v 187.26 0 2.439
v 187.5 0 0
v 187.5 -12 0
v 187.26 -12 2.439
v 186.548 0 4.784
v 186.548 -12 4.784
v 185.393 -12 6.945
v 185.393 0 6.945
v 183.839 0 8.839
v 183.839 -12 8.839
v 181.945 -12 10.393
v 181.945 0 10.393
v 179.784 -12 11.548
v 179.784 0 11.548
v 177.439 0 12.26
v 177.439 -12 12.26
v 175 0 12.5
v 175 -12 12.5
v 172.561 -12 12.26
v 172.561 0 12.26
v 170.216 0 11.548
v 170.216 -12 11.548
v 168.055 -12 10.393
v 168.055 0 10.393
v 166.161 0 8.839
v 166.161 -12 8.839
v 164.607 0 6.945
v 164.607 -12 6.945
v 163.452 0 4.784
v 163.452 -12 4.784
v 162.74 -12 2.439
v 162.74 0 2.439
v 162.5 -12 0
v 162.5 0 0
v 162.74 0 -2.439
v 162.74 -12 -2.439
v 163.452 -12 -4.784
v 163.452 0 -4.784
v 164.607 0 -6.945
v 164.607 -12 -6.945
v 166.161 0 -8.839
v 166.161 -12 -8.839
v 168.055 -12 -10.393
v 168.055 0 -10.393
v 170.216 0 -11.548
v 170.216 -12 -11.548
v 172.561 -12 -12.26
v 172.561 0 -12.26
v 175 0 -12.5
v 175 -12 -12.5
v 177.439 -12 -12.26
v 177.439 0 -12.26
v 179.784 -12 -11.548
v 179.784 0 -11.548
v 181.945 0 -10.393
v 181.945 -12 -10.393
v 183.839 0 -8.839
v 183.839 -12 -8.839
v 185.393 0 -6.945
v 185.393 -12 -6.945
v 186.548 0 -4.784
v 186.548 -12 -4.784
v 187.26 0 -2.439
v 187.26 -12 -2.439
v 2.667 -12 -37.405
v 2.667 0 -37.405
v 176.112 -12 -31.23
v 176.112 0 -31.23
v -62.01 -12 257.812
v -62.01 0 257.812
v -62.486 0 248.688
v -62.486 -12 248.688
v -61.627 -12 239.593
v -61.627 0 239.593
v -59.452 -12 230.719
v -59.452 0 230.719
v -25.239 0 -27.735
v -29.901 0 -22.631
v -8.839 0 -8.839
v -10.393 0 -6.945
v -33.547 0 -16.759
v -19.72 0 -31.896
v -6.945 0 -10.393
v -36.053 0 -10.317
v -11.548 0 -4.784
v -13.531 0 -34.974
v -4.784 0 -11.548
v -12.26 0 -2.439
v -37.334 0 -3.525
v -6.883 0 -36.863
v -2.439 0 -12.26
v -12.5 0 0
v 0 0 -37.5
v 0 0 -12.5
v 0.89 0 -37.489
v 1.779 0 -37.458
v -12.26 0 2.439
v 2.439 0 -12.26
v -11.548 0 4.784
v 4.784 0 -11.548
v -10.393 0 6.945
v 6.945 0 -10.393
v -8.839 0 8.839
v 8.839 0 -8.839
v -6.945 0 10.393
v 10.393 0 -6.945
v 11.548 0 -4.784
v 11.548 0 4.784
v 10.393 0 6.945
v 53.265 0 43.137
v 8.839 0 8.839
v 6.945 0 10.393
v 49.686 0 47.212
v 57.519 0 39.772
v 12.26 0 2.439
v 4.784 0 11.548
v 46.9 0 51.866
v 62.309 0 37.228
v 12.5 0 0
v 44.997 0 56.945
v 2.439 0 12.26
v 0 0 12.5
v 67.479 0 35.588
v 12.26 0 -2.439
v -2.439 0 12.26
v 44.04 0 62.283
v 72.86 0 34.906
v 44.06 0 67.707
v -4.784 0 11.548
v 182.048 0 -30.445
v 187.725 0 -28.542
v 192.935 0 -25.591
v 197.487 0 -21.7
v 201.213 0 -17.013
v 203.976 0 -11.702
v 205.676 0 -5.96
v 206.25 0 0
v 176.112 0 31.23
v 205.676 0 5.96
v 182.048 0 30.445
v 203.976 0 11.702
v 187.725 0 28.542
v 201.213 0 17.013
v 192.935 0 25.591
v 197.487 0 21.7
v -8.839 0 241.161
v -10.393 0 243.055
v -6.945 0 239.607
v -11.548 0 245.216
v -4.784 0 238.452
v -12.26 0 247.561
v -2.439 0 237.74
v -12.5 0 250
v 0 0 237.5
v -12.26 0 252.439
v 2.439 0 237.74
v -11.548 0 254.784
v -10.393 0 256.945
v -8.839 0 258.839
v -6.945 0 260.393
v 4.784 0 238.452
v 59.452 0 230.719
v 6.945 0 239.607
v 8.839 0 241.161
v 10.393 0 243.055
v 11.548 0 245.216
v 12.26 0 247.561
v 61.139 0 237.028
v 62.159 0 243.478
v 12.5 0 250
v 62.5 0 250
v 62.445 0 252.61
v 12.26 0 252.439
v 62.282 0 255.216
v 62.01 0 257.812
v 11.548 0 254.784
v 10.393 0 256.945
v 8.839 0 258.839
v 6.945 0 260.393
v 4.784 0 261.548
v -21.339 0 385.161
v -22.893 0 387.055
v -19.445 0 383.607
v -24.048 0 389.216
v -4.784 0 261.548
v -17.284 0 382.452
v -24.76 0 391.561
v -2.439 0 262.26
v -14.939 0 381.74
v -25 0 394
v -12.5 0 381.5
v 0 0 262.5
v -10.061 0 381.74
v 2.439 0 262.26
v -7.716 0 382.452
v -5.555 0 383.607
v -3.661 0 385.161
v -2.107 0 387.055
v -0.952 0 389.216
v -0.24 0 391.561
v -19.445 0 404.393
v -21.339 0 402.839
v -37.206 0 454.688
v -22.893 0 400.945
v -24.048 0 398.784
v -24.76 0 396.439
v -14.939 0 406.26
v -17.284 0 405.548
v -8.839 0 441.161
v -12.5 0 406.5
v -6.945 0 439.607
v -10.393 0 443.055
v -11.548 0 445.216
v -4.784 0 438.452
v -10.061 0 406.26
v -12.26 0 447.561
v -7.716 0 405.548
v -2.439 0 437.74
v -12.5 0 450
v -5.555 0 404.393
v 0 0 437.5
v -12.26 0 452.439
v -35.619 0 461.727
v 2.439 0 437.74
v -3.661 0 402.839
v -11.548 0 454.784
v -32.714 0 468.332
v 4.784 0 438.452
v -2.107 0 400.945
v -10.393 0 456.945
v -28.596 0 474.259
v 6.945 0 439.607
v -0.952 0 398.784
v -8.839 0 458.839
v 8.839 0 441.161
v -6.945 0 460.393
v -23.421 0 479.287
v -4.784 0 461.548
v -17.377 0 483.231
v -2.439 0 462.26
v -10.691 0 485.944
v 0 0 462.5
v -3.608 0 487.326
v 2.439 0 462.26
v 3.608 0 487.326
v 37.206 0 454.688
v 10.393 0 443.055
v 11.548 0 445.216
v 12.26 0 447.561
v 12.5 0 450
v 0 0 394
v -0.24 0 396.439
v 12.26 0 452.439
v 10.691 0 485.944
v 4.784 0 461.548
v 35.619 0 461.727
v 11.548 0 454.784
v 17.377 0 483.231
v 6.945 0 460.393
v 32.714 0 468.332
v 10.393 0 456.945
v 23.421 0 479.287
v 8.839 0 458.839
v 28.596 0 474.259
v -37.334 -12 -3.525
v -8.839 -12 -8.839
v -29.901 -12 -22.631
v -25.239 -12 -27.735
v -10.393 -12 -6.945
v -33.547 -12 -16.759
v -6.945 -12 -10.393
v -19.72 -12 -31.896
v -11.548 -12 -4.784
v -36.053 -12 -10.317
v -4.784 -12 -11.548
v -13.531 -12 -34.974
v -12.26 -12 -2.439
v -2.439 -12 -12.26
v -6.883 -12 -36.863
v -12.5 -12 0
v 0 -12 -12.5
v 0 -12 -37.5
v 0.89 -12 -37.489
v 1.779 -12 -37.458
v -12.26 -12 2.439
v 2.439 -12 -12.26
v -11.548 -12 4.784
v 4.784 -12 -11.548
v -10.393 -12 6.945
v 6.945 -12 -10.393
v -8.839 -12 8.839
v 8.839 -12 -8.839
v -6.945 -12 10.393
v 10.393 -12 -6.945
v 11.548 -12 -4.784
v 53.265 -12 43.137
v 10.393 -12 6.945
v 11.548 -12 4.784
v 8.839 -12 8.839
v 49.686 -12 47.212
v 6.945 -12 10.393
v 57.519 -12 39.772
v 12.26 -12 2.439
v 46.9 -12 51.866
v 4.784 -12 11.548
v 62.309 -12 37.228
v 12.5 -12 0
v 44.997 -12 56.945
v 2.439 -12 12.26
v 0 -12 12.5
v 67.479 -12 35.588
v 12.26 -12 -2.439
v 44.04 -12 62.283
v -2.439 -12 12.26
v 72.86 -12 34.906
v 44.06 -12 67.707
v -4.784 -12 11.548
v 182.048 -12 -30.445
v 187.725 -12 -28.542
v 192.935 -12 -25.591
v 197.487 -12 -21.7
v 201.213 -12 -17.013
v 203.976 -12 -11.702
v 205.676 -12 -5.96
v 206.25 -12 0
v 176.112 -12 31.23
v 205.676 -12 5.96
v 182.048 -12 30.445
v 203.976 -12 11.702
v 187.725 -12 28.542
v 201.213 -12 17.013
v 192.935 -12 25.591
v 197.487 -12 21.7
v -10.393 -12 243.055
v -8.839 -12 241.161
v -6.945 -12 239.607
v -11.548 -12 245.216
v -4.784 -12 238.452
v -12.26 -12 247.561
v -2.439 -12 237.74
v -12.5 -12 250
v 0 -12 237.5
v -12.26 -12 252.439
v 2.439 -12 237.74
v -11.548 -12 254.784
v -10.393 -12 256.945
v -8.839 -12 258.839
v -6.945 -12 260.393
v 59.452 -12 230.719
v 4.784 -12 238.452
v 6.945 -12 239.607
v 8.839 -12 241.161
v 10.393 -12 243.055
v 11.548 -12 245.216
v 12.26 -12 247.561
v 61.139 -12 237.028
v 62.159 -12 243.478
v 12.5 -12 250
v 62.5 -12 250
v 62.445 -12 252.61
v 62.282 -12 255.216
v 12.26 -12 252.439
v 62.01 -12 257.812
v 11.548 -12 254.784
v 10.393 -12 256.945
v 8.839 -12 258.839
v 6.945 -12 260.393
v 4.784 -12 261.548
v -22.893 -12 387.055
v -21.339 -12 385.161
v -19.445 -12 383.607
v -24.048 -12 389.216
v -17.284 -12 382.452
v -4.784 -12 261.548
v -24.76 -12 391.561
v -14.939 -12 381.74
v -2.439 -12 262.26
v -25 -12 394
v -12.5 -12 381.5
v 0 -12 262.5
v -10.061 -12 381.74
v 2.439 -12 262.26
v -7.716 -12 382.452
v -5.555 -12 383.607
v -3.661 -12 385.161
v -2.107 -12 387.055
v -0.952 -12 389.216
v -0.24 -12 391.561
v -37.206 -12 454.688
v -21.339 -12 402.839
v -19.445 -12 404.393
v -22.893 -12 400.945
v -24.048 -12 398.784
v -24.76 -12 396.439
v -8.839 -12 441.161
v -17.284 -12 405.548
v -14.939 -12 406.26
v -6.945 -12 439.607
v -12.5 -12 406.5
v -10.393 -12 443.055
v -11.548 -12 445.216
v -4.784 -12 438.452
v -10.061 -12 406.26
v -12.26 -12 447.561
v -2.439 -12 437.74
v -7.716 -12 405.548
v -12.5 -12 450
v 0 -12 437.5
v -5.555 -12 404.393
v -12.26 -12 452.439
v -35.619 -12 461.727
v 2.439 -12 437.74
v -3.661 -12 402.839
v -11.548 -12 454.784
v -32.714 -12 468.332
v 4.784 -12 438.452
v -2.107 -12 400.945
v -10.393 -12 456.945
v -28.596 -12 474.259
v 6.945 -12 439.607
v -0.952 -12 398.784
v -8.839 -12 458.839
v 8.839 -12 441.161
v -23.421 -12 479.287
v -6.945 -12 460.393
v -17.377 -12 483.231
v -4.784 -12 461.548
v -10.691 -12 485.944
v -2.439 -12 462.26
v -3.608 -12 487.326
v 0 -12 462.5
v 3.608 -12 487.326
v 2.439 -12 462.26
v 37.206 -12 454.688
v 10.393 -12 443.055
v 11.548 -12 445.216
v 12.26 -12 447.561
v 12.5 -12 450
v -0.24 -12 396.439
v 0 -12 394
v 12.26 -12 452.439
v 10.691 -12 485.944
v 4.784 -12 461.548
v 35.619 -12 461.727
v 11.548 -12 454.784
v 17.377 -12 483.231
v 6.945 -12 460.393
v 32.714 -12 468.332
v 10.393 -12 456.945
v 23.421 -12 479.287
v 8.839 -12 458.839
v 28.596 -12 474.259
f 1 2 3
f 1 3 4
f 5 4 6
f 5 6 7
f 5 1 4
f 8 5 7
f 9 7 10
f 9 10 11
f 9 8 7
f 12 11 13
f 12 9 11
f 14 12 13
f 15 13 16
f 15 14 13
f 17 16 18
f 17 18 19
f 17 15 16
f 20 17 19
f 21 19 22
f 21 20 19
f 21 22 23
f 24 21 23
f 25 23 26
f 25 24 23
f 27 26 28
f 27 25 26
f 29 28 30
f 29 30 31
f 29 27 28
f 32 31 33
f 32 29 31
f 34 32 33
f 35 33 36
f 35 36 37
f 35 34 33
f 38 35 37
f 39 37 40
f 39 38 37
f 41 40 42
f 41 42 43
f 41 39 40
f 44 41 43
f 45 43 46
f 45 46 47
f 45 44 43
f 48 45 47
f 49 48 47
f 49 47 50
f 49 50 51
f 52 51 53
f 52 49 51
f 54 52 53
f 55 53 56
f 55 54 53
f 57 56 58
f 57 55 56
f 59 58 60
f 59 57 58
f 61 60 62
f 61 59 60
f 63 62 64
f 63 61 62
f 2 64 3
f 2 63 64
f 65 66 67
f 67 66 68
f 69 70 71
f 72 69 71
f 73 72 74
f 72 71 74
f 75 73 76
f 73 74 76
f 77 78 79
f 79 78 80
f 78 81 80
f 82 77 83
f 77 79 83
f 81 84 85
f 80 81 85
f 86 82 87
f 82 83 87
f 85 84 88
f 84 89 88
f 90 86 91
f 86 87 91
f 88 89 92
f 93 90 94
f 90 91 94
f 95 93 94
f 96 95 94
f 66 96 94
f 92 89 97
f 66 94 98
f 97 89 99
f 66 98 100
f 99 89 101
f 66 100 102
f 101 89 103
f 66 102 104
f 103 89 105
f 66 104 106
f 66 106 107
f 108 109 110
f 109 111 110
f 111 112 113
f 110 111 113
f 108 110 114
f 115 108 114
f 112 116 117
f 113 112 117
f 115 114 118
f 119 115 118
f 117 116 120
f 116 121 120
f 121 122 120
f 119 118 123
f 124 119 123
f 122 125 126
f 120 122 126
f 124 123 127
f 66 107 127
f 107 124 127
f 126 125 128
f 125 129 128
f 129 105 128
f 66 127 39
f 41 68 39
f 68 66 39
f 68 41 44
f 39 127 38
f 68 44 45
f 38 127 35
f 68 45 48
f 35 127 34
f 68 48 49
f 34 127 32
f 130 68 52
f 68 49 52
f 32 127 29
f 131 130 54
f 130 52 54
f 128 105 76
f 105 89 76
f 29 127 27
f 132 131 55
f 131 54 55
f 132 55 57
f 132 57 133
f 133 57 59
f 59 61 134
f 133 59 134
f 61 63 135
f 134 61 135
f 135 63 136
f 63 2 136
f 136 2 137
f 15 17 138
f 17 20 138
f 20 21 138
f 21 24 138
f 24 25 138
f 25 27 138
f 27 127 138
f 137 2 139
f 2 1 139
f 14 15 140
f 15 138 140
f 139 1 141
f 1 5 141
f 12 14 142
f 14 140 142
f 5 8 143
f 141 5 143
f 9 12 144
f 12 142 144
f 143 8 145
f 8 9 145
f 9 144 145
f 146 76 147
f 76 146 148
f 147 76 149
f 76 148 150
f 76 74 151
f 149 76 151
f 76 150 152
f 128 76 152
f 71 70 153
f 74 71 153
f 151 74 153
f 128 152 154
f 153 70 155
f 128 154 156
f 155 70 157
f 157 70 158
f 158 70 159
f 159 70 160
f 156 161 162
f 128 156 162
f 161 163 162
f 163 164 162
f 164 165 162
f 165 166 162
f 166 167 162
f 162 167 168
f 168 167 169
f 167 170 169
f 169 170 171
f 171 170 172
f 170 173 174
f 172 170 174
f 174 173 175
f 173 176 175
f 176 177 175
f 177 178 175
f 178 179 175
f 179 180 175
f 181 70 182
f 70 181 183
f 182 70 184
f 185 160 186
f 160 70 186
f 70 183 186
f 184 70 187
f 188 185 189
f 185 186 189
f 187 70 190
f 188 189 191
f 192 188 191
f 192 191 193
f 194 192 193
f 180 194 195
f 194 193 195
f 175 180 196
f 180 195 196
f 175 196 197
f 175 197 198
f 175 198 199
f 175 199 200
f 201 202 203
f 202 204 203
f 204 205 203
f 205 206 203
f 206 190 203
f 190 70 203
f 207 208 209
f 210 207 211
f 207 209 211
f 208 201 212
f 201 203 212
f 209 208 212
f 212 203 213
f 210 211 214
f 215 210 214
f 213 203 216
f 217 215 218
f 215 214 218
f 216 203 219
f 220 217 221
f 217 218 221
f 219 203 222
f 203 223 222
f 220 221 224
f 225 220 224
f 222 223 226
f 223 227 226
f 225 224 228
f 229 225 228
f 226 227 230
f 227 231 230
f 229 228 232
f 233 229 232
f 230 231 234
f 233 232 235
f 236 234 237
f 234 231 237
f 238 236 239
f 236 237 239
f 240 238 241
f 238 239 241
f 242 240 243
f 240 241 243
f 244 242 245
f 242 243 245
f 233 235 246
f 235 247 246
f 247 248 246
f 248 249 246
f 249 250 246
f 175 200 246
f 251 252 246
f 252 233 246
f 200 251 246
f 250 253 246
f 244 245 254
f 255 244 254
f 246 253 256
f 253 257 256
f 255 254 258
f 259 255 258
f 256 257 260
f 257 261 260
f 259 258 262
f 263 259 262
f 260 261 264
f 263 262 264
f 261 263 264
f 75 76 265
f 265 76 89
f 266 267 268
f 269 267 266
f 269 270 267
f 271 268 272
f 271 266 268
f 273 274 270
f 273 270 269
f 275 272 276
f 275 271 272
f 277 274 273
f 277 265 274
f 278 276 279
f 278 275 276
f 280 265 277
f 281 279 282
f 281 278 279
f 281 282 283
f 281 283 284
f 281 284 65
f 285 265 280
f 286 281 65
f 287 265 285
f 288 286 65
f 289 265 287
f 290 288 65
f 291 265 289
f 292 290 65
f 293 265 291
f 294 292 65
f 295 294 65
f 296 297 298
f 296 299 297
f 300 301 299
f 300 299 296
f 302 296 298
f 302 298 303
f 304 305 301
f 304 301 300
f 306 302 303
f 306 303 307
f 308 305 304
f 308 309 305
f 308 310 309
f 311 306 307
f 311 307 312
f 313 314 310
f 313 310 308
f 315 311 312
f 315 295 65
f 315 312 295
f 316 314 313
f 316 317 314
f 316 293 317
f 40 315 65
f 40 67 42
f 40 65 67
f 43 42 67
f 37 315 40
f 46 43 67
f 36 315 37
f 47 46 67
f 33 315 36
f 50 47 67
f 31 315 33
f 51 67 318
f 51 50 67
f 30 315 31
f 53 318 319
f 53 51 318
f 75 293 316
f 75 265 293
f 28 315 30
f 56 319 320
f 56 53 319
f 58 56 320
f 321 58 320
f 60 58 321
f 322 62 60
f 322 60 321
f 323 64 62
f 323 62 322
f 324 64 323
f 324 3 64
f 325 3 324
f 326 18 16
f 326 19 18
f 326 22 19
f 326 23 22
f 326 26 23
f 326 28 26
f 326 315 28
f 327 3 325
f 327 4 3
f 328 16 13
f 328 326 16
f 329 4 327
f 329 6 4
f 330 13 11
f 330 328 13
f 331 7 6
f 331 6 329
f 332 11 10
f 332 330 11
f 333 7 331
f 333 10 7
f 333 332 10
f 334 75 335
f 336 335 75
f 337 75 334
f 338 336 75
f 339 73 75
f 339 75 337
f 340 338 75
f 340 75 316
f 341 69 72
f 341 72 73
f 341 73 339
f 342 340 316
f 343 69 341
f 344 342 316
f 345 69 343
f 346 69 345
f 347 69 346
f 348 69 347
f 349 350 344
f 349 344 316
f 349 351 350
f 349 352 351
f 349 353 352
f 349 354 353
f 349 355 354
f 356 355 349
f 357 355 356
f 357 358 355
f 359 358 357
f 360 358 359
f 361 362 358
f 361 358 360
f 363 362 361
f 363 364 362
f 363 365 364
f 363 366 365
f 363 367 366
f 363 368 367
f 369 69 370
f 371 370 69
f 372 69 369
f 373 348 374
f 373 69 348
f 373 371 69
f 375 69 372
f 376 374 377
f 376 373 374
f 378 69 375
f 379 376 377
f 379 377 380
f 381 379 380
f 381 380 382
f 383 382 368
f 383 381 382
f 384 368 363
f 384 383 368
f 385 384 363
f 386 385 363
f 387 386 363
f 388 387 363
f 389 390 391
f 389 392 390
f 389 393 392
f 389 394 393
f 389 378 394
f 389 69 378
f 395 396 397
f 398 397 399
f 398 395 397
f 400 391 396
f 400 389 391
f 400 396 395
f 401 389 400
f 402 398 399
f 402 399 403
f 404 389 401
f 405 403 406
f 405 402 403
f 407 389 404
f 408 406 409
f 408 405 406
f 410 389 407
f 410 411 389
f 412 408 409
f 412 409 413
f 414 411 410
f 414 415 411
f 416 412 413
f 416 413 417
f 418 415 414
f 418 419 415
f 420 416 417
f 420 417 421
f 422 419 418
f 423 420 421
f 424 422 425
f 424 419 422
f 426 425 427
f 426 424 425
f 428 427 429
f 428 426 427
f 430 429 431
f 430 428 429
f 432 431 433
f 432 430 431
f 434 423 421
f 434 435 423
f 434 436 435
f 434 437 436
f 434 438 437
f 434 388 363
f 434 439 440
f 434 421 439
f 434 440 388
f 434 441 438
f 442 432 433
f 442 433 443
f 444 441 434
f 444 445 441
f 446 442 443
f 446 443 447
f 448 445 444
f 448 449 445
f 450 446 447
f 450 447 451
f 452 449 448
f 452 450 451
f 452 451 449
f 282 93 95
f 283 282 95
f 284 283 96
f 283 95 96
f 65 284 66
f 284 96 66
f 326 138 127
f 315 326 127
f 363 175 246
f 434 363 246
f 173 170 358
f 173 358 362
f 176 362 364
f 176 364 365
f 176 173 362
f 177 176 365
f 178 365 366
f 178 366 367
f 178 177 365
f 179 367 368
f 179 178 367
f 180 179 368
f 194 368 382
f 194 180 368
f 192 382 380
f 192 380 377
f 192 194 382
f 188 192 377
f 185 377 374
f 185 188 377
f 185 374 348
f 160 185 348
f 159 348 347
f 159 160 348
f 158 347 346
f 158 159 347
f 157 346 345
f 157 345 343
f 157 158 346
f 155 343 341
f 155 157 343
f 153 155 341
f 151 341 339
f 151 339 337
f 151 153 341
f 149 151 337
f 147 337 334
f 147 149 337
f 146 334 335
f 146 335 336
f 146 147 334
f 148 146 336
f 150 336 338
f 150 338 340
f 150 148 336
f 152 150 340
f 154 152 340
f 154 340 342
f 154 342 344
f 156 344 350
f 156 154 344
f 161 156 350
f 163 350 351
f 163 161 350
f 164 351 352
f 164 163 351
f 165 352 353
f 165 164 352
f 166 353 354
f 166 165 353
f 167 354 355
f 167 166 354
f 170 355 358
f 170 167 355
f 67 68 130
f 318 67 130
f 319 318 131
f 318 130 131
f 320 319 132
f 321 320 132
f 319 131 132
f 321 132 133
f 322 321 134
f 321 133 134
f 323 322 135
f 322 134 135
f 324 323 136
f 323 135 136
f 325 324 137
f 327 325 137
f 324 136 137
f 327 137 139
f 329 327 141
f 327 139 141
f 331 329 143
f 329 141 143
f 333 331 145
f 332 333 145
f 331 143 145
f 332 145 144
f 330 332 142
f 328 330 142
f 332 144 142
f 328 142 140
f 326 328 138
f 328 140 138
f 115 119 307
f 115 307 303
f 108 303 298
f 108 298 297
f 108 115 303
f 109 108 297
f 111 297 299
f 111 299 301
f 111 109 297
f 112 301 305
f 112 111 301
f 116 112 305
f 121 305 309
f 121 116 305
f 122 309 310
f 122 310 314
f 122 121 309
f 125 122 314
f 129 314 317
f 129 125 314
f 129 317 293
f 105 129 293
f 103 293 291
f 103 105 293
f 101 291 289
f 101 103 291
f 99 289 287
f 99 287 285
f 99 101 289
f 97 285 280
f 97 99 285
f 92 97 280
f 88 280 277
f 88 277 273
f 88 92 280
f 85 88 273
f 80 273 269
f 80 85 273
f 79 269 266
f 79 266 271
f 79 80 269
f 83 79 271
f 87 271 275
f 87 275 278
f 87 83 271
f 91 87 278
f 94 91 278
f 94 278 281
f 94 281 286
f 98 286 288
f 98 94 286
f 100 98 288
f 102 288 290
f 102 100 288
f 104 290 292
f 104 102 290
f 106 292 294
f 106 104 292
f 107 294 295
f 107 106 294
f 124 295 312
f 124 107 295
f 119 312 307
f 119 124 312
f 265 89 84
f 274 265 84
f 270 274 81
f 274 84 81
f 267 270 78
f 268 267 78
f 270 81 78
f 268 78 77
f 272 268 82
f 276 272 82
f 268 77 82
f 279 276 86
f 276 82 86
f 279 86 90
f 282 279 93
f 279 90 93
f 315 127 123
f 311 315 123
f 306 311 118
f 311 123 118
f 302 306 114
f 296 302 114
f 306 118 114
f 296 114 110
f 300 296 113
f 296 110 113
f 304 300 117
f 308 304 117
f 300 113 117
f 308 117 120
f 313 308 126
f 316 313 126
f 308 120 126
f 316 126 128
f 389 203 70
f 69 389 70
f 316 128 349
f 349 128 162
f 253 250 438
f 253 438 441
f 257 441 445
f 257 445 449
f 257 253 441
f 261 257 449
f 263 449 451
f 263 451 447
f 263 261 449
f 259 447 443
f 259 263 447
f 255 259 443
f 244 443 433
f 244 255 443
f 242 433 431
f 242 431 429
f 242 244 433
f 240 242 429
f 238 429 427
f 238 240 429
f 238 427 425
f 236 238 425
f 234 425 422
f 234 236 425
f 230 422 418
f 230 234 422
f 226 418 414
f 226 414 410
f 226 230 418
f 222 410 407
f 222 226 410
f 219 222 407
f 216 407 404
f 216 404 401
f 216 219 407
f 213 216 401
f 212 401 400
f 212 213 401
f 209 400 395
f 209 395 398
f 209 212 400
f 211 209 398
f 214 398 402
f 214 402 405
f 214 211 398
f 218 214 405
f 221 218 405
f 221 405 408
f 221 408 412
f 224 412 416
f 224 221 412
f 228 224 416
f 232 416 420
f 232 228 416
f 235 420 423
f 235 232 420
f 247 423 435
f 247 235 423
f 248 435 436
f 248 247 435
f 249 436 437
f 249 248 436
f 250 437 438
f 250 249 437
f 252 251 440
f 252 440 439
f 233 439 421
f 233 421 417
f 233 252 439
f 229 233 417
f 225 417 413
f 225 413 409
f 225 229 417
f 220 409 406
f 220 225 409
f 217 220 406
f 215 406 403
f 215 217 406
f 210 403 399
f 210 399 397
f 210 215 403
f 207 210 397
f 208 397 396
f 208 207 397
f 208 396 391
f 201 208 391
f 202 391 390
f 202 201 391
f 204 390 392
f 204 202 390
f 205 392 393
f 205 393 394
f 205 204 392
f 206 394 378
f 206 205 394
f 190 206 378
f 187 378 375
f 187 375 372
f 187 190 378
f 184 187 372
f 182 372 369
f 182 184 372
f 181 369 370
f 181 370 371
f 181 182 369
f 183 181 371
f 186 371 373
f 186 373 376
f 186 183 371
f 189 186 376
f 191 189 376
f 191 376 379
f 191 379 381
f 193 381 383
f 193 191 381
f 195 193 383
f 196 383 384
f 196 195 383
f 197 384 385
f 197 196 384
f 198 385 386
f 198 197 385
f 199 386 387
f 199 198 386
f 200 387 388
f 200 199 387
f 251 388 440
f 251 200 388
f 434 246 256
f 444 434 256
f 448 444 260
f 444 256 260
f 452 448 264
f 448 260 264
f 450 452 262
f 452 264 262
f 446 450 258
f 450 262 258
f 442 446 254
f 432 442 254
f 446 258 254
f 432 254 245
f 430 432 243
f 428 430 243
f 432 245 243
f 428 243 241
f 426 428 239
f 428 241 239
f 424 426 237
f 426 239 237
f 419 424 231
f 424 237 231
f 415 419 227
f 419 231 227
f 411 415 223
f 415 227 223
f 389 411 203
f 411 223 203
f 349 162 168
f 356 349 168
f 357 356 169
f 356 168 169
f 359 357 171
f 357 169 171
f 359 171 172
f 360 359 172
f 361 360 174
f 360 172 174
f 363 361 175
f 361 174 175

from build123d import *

# Parameters (mm, degrees)
F0_R     = 12.5
F1_DEPTH = 12


with BuildPart() as f1:
    # F0 (on Front) → F1 (new body)
    with BuildSketch(Plane.XZ):
        with BuildLine():
            ThreePointArc((176.1118317896, -31.230215018), (197.4867432438, -21.7004349792), (206.25, 0))
            ThreePointArc((206.25, 0), (197.4867432438, 21.7004349792), (176.1118317896, 31.230215018))
            ThreePointArc((176.1118317896, 31.230215018), (143.75, 0), (176.1118317896, -31.230215018))
        make_face()
        with Locations((175, 0)):
            Circle(F0_R, mode=Mode.SUBTRACT)
        with BuildLine():
            ThreePointArc((176.1118317896, -31.230215018), (143.75, 0), (176.1118317896, 31.230215018))
            Line((176.1118317896, 31.230215018), (72.8595976104, 34.9061140228))
            ThreePointArc((72.8595976104, 34.9061140228), (51.3833504258, 45.0935396139), (44.0597993868, 67.7072176317))
            Line((44.0597993868, 67.7072176317), (59.4515870825, 230.7189524824))
            ThreePointArc((59.4515870825, 230.7189524824), (0, 187.5), (-59.4515870825, 230.7189524824))
            Line((-59.4515870825, 230.7189524824), (-37.3339459271, -3.5251214894))
            ThreePointArc((-37.3339459271, -3.5251214894), (-1.7645151934, 37.458463478), (37.5, 0))
            ThreePointArc((37.5, 0), (27.4431367381, -25.556295623), (2.6667068815, -37.4050621495))
            Line((2.6667068815, -37.4050621495), (176.1118317896, -31.230215018))
        make_face()
        with BuildLine():
            Line((0, -37.5), (2.6667068815, -37.4050621495))
            ThreePointArc((2.6667068815, -37.4050621495), (27.4431367381, -25.556295623), (37.5, 0))
            ThreePointArc((37.5, 0), (-1.7645151934, 37.458463478), (-37.3339459271, -3.5251214894))
            ThreePointArc((-37.3339459271, -3.5251214894), (-25.2394328794, -27.7348341969), (0, -37.5))
        make_face()
        Circle(F0_R, mode=Mode.SUBTRACT)
        with BuildLine():
            ThreePointArc((0, -37.5), (1.3341981475, -37.4762580216), (2.6667068815, -37.4050621495))
            Line((2.6667068815, -37.4050621495), (0, -37.5))
        make_face()
        with BuildLine():
            Line((62.0097963531, 257.8125), (59.4515870825, 230.7189524824))
            ThreePointArc((59.4515870825, 230.7189524824), (61.7331928247, 240.2397282992), (62.5, 250))
            ThreePointArc((62.5, 250), (62.3773287023, 253.9139320339), (62.0097963531, 257.8125))
        make_face()
        with BuildLine():
            ThreePointArc((-59.4515870825, 230.7189524824), (0, 187.5), (59.4515870825, 230.7189524824))
            Line((59.4515870825, 230.7189524824), (62.0097963531, 257.8125))
            ThreePointArc((62.0097963531, 257.8125), (0, 312.5), (-62.0097963531, 257.8125))
            Line((-62.0097963531, 257.8125), (-59.4515870825, 230.7189524824))
        make_face()
        with Locations((0, 250)):
            Circle(F0_R, mode=Mode.SUBTRACT)
        with BuildLine():
            ThreePointArc((-62.0097963531, 257.8125), (-62.2232432118, 244.1247975176), (-59.4515870825, 230.7189524824))
            Line((-59.4515870825, 230.7189524824), (-62.0097963531, 257.8125))
        make_face()
        with BuildLine():
            ThreePointArc((-62.0097963531, 257.8125), (0, 312.5), (62.0097963531, 257.8125))
            Line((62.0097963531, 257.8125), (37.2058778118, 454.6875))
            ThreePointArc((37.2058778118, 454.6875), (37.4263972214, 452.3483592204), (37.5, 450))
            ThreePointArc((37.5, 450), (-2.3483592204, 412.5736027786), (-37.2058778118, 454.6875))
            Line((-37.2058778118, 454.6875), (-62.0097963531, 257.8125))
        make_face()
        with Locations((-12.5, 394)):
            Circle(F0_R, mode=Mode.SUBTRACT)
        with BuildLine():
            ThreePointArc((37.5, 450), (37.4263972214, 452.3483592204), (37.2058778118, 454.6875))
            ThreePointArc((37.2058778118, 454.6875), (0, 487.5), (-37.2058778118, 454.6875))
            ThreePointArc((-37.2058778118, 454.6875), (-2.3483592204, 412.5736027786), (37.5, 450))
        make_face()
        with Locations((0, 450)):
            Circle(F0_R, mode=Mode.SUBTRACT)
    extrude(amount=F1_DEPTH)


solid = f1.part
